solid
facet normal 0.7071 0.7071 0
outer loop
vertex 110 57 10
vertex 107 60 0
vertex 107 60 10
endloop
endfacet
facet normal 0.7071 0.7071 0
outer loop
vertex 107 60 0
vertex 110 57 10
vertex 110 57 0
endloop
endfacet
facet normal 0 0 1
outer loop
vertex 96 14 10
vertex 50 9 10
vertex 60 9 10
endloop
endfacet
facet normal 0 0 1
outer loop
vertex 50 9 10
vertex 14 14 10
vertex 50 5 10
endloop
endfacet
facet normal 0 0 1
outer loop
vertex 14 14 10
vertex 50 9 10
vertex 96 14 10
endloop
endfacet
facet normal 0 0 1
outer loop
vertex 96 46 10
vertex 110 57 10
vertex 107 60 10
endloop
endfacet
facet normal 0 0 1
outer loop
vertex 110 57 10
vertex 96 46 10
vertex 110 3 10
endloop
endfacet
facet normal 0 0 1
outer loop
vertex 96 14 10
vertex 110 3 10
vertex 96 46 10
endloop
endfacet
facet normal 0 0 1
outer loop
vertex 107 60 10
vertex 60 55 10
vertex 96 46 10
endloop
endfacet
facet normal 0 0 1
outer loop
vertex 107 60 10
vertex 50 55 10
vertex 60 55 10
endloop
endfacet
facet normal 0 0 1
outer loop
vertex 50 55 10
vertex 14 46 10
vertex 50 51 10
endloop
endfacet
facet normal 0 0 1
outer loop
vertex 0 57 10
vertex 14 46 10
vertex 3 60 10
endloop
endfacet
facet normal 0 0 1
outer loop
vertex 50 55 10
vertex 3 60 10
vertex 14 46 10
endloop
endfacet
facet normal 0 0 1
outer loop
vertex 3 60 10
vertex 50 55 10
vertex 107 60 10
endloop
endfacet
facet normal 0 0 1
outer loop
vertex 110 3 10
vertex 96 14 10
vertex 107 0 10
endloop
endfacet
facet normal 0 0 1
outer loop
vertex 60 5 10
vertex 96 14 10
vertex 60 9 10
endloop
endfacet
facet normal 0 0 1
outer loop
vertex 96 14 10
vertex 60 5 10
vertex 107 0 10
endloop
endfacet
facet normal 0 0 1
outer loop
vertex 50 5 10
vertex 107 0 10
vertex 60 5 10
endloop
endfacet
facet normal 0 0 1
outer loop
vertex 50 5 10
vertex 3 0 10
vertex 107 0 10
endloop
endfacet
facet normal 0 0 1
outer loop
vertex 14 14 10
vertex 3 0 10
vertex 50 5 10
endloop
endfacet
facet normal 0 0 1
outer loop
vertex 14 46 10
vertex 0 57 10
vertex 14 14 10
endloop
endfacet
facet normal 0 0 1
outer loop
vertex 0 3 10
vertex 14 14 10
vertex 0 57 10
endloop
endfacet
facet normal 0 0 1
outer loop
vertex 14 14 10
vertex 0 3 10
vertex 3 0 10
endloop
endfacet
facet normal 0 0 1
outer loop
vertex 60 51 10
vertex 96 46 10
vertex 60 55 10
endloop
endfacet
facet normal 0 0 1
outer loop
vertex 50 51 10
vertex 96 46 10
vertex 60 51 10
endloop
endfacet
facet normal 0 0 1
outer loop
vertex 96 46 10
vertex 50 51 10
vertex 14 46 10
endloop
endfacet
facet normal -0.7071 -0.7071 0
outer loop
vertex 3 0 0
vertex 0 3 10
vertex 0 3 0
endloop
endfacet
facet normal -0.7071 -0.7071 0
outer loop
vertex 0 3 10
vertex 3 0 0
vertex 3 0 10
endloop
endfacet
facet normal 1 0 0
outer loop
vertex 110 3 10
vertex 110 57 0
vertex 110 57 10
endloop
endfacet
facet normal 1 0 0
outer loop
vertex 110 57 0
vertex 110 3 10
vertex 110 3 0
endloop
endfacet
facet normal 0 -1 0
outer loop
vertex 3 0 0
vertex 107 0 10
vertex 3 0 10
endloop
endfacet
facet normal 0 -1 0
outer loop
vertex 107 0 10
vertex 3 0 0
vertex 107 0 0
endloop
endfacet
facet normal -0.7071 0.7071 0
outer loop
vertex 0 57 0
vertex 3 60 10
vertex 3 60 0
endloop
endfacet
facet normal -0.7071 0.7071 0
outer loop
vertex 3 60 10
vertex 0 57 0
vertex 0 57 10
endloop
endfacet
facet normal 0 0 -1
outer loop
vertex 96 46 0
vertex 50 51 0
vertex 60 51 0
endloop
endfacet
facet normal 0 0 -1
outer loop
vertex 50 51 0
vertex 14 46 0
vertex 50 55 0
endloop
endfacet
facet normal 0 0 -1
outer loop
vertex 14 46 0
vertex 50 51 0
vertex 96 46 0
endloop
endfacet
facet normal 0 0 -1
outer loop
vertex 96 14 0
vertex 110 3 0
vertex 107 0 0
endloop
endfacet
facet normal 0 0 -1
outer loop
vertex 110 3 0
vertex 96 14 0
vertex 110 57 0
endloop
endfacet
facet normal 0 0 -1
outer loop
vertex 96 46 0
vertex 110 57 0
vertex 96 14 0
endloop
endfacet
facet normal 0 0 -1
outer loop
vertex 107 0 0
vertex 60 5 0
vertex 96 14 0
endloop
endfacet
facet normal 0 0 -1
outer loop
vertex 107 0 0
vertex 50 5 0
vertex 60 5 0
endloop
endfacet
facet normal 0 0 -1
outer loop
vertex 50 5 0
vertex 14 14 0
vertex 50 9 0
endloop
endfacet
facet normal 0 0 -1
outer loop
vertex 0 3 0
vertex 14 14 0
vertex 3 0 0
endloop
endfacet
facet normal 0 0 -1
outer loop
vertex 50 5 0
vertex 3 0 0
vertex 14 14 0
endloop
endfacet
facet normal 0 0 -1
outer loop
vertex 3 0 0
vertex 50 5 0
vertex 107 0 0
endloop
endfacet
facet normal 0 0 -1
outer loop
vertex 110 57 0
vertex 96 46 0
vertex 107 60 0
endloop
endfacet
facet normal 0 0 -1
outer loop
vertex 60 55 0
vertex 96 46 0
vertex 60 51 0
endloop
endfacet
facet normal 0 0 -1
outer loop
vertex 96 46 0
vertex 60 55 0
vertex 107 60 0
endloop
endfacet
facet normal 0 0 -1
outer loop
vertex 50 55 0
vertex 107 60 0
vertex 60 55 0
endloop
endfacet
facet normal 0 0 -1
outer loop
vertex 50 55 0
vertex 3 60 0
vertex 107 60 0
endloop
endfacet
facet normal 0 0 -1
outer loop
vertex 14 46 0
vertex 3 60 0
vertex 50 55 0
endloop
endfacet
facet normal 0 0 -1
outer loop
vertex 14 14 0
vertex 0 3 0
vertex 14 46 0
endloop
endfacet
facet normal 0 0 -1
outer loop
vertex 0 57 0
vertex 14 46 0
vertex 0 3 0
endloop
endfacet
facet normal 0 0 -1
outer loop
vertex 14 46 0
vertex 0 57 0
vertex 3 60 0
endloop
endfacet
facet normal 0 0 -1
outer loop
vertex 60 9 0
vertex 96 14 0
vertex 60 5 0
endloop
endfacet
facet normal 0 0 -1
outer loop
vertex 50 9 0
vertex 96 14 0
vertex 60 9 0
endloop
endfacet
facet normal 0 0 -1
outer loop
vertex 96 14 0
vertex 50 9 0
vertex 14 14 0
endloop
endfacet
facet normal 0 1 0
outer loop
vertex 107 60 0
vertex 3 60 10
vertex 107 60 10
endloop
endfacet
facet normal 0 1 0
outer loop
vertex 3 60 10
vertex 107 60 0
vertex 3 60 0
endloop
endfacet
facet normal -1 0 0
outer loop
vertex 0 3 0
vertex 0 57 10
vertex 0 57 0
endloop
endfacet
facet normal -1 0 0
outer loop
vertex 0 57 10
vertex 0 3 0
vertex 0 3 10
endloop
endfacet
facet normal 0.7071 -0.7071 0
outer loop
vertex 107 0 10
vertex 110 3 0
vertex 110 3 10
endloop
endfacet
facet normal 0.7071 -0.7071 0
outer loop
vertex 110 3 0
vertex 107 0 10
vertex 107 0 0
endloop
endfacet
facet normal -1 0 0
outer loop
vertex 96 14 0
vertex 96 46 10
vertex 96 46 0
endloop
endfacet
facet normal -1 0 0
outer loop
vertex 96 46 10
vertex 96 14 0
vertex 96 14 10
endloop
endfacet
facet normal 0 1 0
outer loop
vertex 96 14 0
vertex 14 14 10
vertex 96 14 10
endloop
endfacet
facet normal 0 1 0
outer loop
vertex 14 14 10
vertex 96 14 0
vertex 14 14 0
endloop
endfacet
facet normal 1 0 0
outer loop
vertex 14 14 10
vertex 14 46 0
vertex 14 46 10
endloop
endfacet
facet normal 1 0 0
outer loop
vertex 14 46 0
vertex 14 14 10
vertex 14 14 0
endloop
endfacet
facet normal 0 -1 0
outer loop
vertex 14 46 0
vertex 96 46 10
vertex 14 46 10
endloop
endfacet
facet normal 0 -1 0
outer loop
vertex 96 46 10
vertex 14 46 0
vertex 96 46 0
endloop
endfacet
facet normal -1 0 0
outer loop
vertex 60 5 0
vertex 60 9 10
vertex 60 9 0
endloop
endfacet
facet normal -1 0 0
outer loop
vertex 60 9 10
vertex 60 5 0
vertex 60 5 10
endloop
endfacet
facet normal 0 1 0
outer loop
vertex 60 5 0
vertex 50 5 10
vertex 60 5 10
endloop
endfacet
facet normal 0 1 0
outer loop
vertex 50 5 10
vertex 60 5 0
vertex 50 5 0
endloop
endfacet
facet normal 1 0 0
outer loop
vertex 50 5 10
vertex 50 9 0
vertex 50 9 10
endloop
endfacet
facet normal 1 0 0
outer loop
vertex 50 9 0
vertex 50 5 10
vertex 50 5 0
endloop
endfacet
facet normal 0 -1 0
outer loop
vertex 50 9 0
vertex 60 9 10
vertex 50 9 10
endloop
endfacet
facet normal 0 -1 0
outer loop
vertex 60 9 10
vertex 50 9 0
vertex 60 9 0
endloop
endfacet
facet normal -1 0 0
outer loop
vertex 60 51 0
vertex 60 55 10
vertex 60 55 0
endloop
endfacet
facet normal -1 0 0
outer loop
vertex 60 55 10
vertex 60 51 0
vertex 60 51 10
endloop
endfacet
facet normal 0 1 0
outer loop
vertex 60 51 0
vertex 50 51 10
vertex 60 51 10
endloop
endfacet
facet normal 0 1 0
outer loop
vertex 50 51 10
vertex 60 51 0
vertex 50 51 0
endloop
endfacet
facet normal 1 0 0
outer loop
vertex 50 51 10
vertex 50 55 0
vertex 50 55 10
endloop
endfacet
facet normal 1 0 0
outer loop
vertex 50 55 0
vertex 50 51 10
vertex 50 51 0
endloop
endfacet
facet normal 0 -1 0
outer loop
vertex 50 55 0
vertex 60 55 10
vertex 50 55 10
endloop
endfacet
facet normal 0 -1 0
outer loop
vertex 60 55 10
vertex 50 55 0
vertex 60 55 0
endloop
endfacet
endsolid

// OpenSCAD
$fn = 32;

// ----------------------------------------------------------------------
// Frame plate: 110 x 60 frame, 14 mm rails
// ----------------------------------------------------------------------

// --- parameters (mm) ---
plate_l = 110;            // plate length, X
plate_w = 60;             // plate width, Y
plate_t = 10;             // plate thickness, Z (extrusion height)
corner_c = 3;             // corner chamfer
frame_bar = 14;           // frame rail width
slot_l = 10;              // adjustment slot length
slot_w = 4;               // adjustment slot width

win_l = plate_l - 2 * frame_bar;  // window length
win_w = plate_w - 2 * frame_bar;  // window width

profile = [[3, 0], [107, 0], [110, 3], [110, 57], [107, 60], [3, 60], [0, 57], [0, 3]];  // primary outline, 8 points, counter clockwise
void_1 = [[14, 14], [96, 14], [96, 46], [14, 46]];  // the window, 4 points
void_2 = [[50, 5], [60, 5], [60, 9], [50, 9]];  // adjustment slot, 4 points
void_3 = [[50, 51], [60, 51], [60, 55], [50, 55]];  // adjustment slot, 4 points

// --- the one profile operation ---
difference() {
  linear_extrude(height = plate_t) polygon(points = profile);
  translate([0, 0, -1])
    linear_extrude(height = plate_t + 2) polygon(points = void_1);
  translate([0, 0, -1])
    linear_extrude(height = plate_t + 2) polygon(points = void_2);
  translate([0, 0, -1])
    linear_extrude(height = plate_t + 2) polygon(points = void_3);
}
